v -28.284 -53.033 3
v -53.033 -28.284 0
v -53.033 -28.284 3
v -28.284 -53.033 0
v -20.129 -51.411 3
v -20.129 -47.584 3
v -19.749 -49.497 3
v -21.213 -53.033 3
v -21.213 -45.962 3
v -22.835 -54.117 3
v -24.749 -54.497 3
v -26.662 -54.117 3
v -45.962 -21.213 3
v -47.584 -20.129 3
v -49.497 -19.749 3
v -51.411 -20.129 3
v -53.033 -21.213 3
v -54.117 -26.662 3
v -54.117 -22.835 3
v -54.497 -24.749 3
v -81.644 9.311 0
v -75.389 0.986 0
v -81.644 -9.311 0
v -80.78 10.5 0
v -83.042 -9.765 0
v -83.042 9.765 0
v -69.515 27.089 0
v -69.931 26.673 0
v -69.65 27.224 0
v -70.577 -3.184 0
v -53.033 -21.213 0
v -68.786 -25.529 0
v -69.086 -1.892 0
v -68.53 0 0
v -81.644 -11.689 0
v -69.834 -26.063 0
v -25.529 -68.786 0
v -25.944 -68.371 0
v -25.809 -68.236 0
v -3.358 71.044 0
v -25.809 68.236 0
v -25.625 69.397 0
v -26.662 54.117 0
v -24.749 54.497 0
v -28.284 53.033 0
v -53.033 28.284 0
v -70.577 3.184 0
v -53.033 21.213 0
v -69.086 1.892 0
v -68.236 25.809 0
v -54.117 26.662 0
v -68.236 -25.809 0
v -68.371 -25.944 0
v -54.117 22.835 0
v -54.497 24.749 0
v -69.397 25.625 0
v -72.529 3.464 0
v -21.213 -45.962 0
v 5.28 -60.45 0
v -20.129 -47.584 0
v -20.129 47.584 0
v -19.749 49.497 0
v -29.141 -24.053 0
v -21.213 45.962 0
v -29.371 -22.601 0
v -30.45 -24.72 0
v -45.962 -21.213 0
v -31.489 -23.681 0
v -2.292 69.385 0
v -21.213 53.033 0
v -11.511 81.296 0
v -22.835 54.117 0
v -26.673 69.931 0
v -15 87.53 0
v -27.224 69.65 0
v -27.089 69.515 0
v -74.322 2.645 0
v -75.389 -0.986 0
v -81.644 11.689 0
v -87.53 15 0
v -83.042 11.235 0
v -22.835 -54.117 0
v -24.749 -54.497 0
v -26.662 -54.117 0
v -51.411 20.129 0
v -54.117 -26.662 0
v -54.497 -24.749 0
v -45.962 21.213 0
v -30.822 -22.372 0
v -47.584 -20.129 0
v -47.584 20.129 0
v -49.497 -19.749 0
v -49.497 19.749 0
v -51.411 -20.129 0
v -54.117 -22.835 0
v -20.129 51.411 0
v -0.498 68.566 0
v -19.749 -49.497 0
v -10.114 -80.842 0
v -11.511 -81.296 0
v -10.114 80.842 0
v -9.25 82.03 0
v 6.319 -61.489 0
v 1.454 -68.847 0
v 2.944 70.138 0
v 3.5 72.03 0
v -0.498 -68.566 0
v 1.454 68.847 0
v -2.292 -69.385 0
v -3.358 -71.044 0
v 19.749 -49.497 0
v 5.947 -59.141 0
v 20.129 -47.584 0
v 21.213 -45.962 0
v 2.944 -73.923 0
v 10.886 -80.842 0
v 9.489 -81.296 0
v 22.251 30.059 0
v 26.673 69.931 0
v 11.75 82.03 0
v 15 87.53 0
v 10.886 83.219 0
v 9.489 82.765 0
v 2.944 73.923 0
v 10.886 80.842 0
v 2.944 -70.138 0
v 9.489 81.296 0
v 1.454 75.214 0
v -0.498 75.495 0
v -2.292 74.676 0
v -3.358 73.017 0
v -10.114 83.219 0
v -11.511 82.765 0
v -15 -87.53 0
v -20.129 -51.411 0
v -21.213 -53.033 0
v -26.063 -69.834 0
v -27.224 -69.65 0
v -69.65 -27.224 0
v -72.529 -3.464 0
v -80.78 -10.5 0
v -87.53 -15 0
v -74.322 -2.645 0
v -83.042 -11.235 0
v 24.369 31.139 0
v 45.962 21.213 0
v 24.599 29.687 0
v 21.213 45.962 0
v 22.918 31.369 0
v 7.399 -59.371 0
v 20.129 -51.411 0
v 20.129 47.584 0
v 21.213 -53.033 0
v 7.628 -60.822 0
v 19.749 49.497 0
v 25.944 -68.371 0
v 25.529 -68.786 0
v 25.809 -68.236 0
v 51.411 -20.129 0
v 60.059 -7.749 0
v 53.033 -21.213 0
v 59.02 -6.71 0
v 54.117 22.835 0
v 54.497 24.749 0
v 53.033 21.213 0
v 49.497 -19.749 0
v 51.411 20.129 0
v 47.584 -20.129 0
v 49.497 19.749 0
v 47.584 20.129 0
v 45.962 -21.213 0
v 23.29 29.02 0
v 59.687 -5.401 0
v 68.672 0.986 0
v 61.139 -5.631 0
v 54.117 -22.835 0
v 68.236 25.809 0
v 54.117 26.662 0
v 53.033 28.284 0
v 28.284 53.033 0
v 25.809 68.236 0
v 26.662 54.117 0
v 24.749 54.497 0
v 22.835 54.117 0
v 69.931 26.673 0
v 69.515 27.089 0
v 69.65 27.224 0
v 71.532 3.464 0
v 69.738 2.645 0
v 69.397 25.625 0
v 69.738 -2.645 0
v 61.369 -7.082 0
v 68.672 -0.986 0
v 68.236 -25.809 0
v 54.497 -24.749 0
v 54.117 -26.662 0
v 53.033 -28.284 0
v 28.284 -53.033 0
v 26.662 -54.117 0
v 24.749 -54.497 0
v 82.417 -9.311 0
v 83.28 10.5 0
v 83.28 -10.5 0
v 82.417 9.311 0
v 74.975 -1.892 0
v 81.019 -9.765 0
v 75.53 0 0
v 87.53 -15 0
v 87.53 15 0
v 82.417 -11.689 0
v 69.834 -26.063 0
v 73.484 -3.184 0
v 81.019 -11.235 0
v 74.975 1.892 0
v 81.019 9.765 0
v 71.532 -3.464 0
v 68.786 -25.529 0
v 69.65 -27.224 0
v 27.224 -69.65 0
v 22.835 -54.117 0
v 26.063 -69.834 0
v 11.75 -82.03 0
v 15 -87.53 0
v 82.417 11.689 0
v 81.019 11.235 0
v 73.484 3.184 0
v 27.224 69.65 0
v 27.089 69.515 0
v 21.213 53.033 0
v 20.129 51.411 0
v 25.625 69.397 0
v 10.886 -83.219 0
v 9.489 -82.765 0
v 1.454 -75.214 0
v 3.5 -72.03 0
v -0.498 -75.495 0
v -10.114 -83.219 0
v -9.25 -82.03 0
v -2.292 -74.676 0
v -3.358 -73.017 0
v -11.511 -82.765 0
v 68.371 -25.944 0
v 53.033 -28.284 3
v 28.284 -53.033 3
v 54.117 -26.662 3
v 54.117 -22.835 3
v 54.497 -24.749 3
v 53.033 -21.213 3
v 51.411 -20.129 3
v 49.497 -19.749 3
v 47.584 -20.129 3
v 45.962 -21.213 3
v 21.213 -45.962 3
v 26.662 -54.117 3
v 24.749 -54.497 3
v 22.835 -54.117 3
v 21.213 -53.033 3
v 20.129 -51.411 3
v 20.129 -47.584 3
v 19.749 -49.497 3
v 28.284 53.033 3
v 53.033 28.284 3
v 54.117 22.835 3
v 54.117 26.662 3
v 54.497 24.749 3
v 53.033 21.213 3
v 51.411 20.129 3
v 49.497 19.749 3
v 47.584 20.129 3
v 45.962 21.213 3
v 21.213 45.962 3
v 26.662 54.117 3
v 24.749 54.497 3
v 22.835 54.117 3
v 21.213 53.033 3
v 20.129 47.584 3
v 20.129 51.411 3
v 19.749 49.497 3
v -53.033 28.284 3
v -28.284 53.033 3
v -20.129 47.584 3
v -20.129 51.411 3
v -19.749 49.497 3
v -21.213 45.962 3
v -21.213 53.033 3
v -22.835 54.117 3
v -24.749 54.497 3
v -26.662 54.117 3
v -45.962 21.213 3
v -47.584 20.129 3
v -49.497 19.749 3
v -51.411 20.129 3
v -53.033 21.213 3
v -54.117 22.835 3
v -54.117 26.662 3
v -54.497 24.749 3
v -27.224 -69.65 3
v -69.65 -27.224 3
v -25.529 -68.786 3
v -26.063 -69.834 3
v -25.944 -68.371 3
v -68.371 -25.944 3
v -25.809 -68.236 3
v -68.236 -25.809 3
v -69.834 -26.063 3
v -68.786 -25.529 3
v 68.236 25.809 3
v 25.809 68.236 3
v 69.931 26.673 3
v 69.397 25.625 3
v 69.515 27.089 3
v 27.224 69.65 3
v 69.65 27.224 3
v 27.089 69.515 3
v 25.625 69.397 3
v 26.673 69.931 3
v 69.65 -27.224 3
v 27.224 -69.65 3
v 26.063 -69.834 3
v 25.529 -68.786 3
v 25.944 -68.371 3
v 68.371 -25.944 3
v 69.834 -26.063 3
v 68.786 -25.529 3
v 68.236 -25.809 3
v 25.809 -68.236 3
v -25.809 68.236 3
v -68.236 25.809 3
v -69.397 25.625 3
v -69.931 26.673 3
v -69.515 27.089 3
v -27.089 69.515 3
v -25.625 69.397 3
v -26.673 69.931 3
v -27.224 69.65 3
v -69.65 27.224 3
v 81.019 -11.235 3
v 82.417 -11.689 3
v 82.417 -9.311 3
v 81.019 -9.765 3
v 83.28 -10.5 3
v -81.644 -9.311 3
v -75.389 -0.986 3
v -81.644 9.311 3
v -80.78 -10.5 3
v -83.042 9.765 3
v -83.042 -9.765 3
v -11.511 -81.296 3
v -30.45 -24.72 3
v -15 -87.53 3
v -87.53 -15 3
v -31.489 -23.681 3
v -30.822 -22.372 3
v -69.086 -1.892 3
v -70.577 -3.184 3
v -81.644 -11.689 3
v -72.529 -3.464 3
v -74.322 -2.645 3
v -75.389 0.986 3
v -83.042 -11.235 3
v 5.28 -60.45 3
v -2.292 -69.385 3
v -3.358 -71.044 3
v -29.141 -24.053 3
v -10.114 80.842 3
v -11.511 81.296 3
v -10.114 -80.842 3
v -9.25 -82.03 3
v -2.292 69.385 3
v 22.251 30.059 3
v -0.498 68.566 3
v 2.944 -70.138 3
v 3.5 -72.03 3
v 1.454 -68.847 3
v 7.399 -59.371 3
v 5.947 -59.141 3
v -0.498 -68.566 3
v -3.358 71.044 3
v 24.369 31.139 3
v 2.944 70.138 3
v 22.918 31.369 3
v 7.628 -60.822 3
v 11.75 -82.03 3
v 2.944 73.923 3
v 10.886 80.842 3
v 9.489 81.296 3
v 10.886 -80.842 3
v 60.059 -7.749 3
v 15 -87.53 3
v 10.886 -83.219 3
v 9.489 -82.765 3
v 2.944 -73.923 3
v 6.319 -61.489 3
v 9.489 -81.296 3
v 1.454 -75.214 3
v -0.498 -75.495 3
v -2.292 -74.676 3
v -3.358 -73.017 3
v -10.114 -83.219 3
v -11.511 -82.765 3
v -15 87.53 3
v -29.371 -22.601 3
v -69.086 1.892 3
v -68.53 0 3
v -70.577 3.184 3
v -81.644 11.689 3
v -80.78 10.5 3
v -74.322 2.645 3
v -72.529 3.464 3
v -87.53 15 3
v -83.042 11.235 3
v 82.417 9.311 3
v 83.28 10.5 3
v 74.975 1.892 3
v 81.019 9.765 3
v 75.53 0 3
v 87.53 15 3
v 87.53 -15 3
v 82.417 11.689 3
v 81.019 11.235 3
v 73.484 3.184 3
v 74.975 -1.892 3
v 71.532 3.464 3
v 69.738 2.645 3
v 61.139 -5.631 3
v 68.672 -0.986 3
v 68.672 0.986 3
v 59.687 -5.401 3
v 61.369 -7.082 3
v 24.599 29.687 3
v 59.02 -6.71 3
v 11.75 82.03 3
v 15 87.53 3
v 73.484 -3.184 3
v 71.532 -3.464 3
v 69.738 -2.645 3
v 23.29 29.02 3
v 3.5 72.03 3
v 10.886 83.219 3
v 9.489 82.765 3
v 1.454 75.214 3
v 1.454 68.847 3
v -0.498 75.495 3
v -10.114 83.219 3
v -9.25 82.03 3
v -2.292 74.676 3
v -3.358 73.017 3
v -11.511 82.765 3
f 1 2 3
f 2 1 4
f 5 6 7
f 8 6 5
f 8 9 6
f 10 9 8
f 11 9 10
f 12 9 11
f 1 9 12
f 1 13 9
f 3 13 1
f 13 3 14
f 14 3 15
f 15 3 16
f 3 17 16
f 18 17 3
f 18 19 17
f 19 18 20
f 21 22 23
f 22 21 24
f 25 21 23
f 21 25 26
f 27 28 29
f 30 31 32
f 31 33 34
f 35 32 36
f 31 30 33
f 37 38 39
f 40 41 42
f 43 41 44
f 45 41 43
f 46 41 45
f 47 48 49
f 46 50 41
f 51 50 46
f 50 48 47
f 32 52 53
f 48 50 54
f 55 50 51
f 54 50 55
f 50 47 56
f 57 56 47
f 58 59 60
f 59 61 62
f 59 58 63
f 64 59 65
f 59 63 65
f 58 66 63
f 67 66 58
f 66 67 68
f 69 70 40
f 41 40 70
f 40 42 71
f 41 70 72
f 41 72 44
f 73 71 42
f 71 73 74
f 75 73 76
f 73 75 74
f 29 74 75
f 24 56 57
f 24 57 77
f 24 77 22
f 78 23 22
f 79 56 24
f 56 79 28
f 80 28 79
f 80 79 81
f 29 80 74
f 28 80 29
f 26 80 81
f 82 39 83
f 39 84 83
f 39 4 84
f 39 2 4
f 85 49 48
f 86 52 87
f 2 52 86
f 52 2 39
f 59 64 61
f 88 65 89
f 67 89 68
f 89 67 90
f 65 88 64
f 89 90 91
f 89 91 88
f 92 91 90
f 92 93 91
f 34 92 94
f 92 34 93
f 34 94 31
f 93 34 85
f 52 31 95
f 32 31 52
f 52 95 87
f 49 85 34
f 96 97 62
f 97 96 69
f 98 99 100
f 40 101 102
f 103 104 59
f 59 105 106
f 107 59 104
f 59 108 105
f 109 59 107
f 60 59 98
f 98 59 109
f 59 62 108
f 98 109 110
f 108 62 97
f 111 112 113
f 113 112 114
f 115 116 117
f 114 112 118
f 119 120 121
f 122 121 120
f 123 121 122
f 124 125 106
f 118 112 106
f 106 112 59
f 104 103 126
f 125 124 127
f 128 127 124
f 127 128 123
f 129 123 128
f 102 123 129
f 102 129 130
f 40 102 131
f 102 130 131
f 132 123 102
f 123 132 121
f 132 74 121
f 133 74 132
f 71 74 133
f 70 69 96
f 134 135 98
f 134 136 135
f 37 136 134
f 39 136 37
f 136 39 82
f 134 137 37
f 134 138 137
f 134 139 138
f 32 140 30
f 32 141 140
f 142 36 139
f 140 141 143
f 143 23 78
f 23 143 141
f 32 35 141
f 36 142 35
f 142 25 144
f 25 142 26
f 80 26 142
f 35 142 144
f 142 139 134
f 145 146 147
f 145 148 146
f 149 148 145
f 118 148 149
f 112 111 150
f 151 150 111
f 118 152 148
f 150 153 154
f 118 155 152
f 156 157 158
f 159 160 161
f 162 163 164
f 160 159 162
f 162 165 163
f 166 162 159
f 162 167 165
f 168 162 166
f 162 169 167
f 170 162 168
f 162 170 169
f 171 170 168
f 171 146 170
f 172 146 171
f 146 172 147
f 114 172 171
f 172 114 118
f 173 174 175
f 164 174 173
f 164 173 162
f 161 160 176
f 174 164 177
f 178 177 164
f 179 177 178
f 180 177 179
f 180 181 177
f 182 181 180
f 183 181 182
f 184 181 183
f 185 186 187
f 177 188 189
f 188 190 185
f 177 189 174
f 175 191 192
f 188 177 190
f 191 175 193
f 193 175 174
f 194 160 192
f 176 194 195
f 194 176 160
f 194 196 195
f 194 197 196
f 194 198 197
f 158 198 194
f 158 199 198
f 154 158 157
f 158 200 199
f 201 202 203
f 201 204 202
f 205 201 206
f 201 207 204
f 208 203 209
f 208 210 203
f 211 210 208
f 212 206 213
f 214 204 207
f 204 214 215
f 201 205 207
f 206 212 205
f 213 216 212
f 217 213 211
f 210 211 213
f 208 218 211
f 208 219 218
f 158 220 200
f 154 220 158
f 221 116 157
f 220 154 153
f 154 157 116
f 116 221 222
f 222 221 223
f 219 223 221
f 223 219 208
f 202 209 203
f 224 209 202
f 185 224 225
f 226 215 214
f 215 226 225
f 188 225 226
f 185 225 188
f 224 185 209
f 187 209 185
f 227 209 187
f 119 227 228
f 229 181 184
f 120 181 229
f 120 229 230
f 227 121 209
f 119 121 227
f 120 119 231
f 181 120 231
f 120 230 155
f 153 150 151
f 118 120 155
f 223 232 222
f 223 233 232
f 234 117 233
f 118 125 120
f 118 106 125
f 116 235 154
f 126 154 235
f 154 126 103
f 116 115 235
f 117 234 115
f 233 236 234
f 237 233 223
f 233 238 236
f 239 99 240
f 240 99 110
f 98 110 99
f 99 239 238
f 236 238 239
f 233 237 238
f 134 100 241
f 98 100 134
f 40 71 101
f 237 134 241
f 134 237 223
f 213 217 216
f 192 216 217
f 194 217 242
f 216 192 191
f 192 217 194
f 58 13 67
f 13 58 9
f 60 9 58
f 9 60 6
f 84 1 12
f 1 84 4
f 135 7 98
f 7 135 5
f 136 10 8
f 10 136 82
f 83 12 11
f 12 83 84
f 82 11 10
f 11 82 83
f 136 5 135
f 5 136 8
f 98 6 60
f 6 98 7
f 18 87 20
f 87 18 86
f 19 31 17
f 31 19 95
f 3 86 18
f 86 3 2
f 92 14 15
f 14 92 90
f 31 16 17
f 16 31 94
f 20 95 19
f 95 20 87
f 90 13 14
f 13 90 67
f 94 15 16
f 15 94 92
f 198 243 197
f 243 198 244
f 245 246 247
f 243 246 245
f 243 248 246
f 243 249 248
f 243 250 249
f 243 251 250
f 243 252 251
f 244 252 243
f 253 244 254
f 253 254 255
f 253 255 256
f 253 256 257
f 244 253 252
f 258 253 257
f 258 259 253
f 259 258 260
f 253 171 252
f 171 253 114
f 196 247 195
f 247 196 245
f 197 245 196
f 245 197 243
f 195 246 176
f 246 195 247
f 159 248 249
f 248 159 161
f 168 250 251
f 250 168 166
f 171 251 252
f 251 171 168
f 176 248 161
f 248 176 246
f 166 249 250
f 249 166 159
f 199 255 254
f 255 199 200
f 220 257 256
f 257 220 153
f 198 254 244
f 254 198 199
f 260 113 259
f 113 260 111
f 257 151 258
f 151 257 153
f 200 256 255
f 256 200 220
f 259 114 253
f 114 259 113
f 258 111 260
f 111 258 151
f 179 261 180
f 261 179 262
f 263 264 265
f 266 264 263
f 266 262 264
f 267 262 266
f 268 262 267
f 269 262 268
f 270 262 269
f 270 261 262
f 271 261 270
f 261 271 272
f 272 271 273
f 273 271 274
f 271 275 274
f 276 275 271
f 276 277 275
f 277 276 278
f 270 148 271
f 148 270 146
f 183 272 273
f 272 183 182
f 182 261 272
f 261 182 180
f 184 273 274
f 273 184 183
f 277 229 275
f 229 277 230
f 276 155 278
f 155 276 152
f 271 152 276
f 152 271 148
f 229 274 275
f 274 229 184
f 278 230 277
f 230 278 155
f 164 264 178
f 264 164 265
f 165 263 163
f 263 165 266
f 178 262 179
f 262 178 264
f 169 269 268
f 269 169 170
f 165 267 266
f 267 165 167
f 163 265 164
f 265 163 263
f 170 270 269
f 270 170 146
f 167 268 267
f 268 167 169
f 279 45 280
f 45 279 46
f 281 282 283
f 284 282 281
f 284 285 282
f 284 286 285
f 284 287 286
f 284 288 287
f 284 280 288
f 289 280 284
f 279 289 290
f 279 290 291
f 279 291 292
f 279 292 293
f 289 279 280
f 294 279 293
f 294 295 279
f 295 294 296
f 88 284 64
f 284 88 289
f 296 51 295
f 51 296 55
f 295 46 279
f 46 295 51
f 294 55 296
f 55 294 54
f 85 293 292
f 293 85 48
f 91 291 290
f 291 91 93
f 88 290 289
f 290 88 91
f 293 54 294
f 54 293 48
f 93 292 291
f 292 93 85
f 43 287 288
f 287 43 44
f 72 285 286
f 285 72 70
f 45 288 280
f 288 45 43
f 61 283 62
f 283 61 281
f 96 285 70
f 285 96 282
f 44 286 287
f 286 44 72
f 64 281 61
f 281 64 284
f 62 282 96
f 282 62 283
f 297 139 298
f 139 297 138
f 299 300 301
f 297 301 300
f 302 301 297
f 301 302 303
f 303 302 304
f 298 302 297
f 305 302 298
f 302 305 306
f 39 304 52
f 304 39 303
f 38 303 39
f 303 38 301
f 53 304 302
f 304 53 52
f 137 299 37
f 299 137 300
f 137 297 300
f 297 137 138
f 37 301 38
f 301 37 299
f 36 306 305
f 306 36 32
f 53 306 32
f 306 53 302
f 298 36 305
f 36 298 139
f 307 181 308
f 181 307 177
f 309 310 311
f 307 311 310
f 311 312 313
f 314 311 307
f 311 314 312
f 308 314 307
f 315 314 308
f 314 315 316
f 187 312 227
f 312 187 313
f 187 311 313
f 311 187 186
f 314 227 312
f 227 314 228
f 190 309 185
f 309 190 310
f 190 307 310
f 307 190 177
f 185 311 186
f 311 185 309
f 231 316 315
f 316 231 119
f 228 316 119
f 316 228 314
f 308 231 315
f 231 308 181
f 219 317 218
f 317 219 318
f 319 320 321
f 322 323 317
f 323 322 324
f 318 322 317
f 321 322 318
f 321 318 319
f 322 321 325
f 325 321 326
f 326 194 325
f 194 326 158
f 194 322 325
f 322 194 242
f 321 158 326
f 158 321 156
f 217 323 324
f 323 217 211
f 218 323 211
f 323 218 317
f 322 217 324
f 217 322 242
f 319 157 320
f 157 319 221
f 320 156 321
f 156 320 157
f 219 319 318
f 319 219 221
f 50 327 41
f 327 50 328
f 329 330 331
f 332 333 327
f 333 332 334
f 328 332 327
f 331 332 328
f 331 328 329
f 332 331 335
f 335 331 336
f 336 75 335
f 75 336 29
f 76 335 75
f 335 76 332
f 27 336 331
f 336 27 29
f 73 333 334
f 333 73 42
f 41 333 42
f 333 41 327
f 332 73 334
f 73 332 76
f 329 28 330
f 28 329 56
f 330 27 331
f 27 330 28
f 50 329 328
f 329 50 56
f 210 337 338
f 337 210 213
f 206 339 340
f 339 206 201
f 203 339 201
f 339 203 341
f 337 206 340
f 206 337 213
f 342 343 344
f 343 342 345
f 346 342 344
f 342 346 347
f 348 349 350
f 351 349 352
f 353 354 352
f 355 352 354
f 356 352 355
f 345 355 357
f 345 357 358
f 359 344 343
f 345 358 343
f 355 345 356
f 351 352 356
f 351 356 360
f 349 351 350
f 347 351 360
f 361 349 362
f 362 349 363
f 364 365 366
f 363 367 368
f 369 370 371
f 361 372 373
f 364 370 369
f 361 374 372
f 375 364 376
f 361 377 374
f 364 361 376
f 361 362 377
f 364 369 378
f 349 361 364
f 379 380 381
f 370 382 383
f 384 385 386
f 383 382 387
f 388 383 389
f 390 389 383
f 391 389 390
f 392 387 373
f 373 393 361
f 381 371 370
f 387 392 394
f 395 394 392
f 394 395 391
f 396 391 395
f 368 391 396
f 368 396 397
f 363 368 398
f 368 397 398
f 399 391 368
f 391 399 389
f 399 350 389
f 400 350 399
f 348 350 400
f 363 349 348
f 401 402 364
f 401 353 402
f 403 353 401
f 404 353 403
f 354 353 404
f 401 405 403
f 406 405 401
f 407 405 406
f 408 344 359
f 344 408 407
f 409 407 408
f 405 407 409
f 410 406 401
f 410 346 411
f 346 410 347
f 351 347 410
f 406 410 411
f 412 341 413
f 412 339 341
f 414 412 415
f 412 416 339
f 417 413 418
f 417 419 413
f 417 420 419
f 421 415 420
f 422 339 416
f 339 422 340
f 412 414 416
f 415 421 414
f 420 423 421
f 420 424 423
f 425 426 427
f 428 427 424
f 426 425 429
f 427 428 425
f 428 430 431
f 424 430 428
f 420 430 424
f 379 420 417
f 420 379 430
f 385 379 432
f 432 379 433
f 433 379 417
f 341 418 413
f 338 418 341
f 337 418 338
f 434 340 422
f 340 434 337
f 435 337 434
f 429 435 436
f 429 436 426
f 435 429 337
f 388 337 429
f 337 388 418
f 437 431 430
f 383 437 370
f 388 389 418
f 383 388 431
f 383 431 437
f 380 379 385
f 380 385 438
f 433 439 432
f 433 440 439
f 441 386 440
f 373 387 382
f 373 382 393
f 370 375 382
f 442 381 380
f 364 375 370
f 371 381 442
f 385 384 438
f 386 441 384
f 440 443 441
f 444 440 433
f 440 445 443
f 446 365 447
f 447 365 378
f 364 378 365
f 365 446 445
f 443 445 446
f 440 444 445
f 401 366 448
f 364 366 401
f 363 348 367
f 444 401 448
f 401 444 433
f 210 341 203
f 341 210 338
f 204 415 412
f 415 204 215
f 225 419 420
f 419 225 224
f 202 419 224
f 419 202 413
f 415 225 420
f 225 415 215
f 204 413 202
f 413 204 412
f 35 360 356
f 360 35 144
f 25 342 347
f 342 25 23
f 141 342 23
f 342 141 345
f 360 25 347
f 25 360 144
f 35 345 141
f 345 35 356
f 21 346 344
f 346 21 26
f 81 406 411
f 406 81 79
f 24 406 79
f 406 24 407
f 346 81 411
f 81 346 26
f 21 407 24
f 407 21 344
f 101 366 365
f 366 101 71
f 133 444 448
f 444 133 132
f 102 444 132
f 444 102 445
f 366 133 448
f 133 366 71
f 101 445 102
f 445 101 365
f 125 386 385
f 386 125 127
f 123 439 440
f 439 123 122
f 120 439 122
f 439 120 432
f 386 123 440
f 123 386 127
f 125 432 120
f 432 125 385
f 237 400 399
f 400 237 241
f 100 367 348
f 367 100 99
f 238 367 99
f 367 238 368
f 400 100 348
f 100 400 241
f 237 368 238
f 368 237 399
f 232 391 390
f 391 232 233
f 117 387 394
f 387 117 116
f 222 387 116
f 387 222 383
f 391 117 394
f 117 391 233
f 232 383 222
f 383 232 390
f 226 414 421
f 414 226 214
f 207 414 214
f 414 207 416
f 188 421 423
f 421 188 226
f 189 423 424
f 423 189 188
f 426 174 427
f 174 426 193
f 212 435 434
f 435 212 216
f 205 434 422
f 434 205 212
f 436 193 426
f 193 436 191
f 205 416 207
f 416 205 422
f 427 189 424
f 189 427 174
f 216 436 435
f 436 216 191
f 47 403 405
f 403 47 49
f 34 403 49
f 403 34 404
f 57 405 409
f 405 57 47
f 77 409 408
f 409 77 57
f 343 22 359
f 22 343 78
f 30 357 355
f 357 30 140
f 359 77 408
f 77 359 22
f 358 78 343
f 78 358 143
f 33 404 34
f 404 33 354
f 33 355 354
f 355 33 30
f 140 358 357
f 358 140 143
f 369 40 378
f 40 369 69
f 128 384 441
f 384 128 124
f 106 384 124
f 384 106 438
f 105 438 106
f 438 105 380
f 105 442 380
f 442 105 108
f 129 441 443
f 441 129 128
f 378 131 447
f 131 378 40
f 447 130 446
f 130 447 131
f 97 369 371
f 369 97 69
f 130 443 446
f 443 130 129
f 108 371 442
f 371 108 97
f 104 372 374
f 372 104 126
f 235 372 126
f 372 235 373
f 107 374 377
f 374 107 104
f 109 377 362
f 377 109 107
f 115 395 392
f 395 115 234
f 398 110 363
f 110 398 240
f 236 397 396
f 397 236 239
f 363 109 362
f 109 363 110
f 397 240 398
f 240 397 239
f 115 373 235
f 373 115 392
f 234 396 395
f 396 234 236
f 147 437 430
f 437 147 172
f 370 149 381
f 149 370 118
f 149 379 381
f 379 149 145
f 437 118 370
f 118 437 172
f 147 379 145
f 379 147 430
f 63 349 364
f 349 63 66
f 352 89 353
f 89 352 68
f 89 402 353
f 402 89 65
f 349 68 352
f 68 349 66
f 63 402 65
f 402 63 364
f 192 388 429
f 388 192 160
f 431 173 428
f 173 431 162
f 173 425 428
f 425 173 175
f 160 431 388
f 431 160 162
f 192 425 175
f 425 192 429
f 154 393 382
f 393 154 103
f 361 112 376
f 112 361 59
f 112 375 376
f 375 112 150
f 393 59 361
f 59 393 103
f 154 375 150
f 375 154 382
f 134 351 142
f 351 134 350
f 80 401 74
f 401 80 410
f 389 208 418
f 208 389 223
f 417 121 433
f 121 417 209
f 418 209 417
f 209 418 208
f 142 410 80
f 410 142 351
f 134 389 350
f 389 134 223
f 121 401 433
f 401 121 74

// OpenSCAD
// file: common.scad
module M25Hole(x, y, z, depth) {
    translate([x, y, z]) {
        cylinder(h = depth, d = 2.5, center = true);
    }
}

module M6Hole(x, y, z, depth) {
    translate([x, y, z]) {
        cylinder(h = depth, d = 7.0, center = true);
    }
}

module Plate(plate_width, plate_depth) {
  difference() {
    // plate
    rotate(45) {
      translate([-plate_width / 2.0, -plate_width / 2.0, 0.0]) {
        cube([plate_width, plate_width, plate_depth]);
      }
    }

    // square cut plate corners
    A = plate_width;
    B = sqrt(2 * pow(A, 2));
    C = 30.0;
    D = 30.0;

    translate([B / 2.0, 0.0, plate_depth / 2.0]) {
      cube([C, D, plate_depth], true);
    }
    translate([-B / 2.0, 0.0, plate_depth / 2.0]) {
      cube([C, D, plate_depth], true);
    }
    translate([0.0, -B / 2.0, plate_depth / 2.0]) {
      cube([D, C, plate_depth], true);
    }
    translate([0.0, B/ 2.0, plate_depth / 2.0]) {
      cube([D, C, plate_depth], true);
    }

    // holes
    rotate(-135) {
      CableRoutingHoles(plate_width, plate_depth);
      CableFasteningHoles(plate_width, plate_depth);
    }
    ArmScrewHoles(plate_width, plate_depth, B - C);
    StackHoles(plate_width, plate_depth, B - C);
  }
}

module OdroidXU4MountHoles(plate_depth) {
    depth = 76;
    width = 52;

    rotate(45) {
        M25Hole(depth / 2.0, width / 2.0, 0.0, plate_depth * 2);
        M25Hole(-depth / 2.0, width / 2.0, 0.0, plate_depth * 2);
        M25Hole(depth / 2.0, -width / 2.0, 0.0, plate_depth * 2);
        M25Hole(-depth / 2.0, -width / 2.0, 0.0, plate_depth * 2);
    }
}

module StackHoles(plate_width, plate_depth, plate_diagonal) {
    between_line = 20.0;

    E = 5.5;
    F = (plate_diagonal / 2.0) - E;
    H = F - (between_line / 2.0);

    M6Hole(H, 0.0, plate_depth / 2.0, plate_depth);
    M6Hole(-H, 0.0, plate_depth / 2.0, plate_depth);
    M6Hole(0.0, H, plate_depth / 2.0, plate_depth);
    M6Hole(0.0, -H, plate_depth / 2.0, plate_depth);
}

module CableFasteningHoles(plate_width, plate_depth) {
  inner_width = plate_width - 10.0;
  hole_width = 60;
  hole_length = 2;

  translate([inner_width / 2.0, 0.0, plate_depth / 2.0]) {
    cube(size=[hole_length, hole_width, plate_depth], center=true);
    translate([0.0, hole_width / 2.0, -plate_depth / 2.0]) {
      cylinder(r=hole_length / 2.0, h=plate_depth, center=false);
    }
    translate([0.0, -hole_width / 2.0, -plate_depth / 2.0]) {
      cylinder(r=hole_length / 2.0, h=plate_depth, center=false);
    }
  }

  translate([-inner_width / 2.0, 0.0, plate_depth / 2.0]) {
    cube(size=[hole_length, hole_width, plate_depth], center=true);
    translate([0.0, hole_width / 2.0, -plate_depth / 2.0]) {
      cylinder(r=hole_length / 2.0, h=plate_depth, center=false);
    }
    translate([0.0, -hole_width / 2.0, -plate_depth / 2.0]) {
      cylinder(r=hole_length / 2.0, h=plate_depth, center=false);
    }
  }

  rotate(90) translate([inner_width / 2.0, 0.0, plate_depth / 2.0]) {
    cube(size=[hole_length, hole_width, plate_depth], center=true);
    translate([0.0, hole_width / 2.0, -plate_depth / 2.0]) {
      cylinder(r=hole_length / 2.0, h=plate_depth, center=false);
    }
    translate([0.0, -hole_width / 2.0, -plate_depth / 2.0]) {
      cylinder(r=hole_length / 2.0, h=plate_depth, center=false);
    }
  }

  rotate(90) translate([-inner_width / 2.0, 0.0, plate_depth / 2.0]) {
    cube(size=[hole_length, hole_width, plate_depth], center=true);
    translate([0.0, hole_width / 2.0, -plate_depth / 2.0]) {
      cylinder(r=hole_length / 2.0, h=plate_depth, center=false);
    }
    translate([0.0, -hole_width / 2.0, -plate_depth / 2.0]) {
      cylinder(r=hole_length / 2.0, h=plate_depth, center=false);
    }
  }
}

module CableRoutingHoles(plate_width, plate_depth) {
  routing_width = plate_width - 40.0;
  hole_width = 35;
  hole_length = 10;

  // inner cable fastening holes
  translate([routing_width / 2.0, 0.0, plate_depth / 2.0]) {
    cube(size=[hole_length, hole_width, plate_depth], center=true);
    translate([0.0, hole_width / 2.0, -plate_depth / 2.0]) {
      cylinder(r=hole_length / 2.0, h=plate_depth, center=false);
    }
    translate([0.0, -hole_width / 2.0, -plate_depth / 2.0]) {
      cylinder(r=hole_length / 2.0, h=plate_depth, center=false);
    }
  }

  rotate(90) translate([routing_width / 2.0, 0.0, plate_depth / 2.0]) {
    cube(size=[hole_length, hole_width, plate_depth], center=true);
    translate([0.0, hole_width / 2.0, -plate_depth / 2.0]) {
      cylinder(r=hole_length / 2.0, h=plate_depth, center=false);
    }
    translate([0.0, -hole_width / 2.0, -plate_depth / 2.0]) {
      cylinder(r=hole_length / 2.0, h=plate_depth, center=false);
    }
  }

  rotate(180) translate([routing_width / 2.0, 0.0, plate_depth / 2.0]) {
    cube(size=[hole_length, hole_width, plate_depth], center=true);
    translate([0.0, hole_width / 2.0, -plate_depth / 2.0]) {
      cylinder(r=hole_length / 2.0, h=plate_depth, center=false);
    }
    translate([0.0, -hole_width / 2.0, -plate_depth / 2.0]) {
      cylinder(r=hole_length / 2.0, h=plate_depth, center=false);
    }
  }

  rotate(270) translate([routing_width / 2.0, 0.0, plate_depth / 2.0]) {
    cube(size=[hole_length, hole_width, plate_depth], center=true);
    translate([0.0, hole_width / 2.0, -plate_depth / 2.0]) {
      cylinder(r=hole_length / 2.0, h=plate_depth, center=false);
    }
    translate([0.0, -hole_width / 2.0, -plate_depth / 2.0]) {
      cylinder(r=hole_length / 2.0, h=plate_depth, center=false);
    }
  }
}

module BatteryStrapHoles(plate_width, plate_depth) {
  hole_width = 5;
  hole_length = 25;
  hole_between_width = 45;

  rotate(45) {
    translate([hole_between_width / 2.0, 0.0, plate_depth / 2.0]) {
      cube([hole_width, hole_length, plate_depth], center = true);
      translate([0.0, hole_length / 2.0, -plate_depth / 2.0]) {
        cylinder(r=hole_width / 2.0, h=plate_depth, center=false);
      }
      translate([0.0, -hole_length / 2.0, -plate_depth / 2.0]) {
        cylinder(r=hole_width / 2.0, h=plate_depth, center=false);
      }
    }
  }

  rotate(45) {
    translate([-hole_between_width / 2.0, 0.0, plate_depth / 2.0]) {
      cube([hole_width, hole_length, plate_depth], center = true);
      translate([0.0, hole_length / 2.0, -plate_depth / 2.0]) {
        cylinder(r=hole_width / 2.0, h=plate_depth, center=false);
      }
      translate([0.0, -hole_length / 2.0, -plate_depth / 2.0]) {
        cylinder(r=hole_width / 2.0, h=plate_depth, center=false);
      }
    }
  }
}

module LowerArmScrewHoles(plate_width, plate_depth, plate_diagonal) {
  base_line = 21.0;
  between_line = 20.0;

  E = 5.5;
  F = (plate_diagonal / 2.0) - E;
  G = F - between_line;

  // outer screw holes
  M25Hole(F, -base_line / 2.0, plate_depth / 2.0, plate_depth);
  M25Hole(F, base_line / 2.0, plate_depth / 2.0, plate_depth);

  M25Hole(-F, -base_line / 2.0, plate_depth / 2.0, plate_depth);
  M25Hole(-F, base_line / 2.0, plate_depth / 2.0, plate_depth);

  M25Hole(-base_line / 2.0, F, plate_depth / 2.0, plate_depth);
  M25Hole(base_line / 2.0, F, plate_depth / 2.0, plate_depth);

  M25Hole(-base_line / 2.0, -F, plate_depth / 2.0, plate_depth);
  M25Hole(base_line / 2.0, -F, plate_depth / 2.0, plate_depth);
}
// main file
use <common.scad>

// plate parameters
plate_width = 145.0;
plate_depth = 3.0;

module StackHoles(plate_width, plate_depth, plate_diagonal) {
  between_line = 20.0;

  E = 5.5;
  F = (plate_diagonal / 2.0) - E;
  H = F - (between_line / 2.0);

  M6Hole(H, 0.0, plate_depth / 2.0, plate_depth);
  M6Hole(-H, 0.0, plate_depth / 2.0, plate_depth);
  M6Hole(0.0, H, plate_depth / 2.0, plate_depth);
  M6Hole(0.0, -H, plate_depth / 2.0, plate_depth);
}

module LowerPlate(plate_width, plate_depth) {
  difference() {
    // plate
    rotate(45) {
      translate([-plate_width / 2.0, -plate_width / 2.0, 0.0]) {
        cube([plate_width, plate_width, plate_depth]);
      }
    }

    // square cut plate corners
    A = plate_width;
    B = sqrt(2 * pow(A, 2));
    C = 30.0;
    D = 30.0;

    translate([B / 2.0, 0.0, plate_depth / 2.0]) {
      cube([C, D, plate_depth], true);
    }
    translate([-B / 2.0, 0.0, plate_depth / 2.0]) {
      cube([C, D, plate_depth], true);
    }
    translate([0.0, -B / 2.0, plate_depth / 2.0]) {
      cube([D, C, plate_depth], true);
    }
    translate([0.0, B/ 2.0, plate_depth / 2.0]) {
      cube([D, C, plate_depth], true);
    }

    // holes
    rotate(-135) {
      CableRoutingHoles(plate_width, plate_depth);
      CableFasteningHoles(plate_width, plate_depth);
    }
    LowerArmScrewHoles(plate_width, plate_depth, B - C);
    StackHoles(plate_width, plate_depth, B - C);

    translate([15, -15, 0])
      OdroidXU4MountHoles(plate_depth);
      // rotate(180)
  }
}

LowerPlate(plate_width, plate_depth);
